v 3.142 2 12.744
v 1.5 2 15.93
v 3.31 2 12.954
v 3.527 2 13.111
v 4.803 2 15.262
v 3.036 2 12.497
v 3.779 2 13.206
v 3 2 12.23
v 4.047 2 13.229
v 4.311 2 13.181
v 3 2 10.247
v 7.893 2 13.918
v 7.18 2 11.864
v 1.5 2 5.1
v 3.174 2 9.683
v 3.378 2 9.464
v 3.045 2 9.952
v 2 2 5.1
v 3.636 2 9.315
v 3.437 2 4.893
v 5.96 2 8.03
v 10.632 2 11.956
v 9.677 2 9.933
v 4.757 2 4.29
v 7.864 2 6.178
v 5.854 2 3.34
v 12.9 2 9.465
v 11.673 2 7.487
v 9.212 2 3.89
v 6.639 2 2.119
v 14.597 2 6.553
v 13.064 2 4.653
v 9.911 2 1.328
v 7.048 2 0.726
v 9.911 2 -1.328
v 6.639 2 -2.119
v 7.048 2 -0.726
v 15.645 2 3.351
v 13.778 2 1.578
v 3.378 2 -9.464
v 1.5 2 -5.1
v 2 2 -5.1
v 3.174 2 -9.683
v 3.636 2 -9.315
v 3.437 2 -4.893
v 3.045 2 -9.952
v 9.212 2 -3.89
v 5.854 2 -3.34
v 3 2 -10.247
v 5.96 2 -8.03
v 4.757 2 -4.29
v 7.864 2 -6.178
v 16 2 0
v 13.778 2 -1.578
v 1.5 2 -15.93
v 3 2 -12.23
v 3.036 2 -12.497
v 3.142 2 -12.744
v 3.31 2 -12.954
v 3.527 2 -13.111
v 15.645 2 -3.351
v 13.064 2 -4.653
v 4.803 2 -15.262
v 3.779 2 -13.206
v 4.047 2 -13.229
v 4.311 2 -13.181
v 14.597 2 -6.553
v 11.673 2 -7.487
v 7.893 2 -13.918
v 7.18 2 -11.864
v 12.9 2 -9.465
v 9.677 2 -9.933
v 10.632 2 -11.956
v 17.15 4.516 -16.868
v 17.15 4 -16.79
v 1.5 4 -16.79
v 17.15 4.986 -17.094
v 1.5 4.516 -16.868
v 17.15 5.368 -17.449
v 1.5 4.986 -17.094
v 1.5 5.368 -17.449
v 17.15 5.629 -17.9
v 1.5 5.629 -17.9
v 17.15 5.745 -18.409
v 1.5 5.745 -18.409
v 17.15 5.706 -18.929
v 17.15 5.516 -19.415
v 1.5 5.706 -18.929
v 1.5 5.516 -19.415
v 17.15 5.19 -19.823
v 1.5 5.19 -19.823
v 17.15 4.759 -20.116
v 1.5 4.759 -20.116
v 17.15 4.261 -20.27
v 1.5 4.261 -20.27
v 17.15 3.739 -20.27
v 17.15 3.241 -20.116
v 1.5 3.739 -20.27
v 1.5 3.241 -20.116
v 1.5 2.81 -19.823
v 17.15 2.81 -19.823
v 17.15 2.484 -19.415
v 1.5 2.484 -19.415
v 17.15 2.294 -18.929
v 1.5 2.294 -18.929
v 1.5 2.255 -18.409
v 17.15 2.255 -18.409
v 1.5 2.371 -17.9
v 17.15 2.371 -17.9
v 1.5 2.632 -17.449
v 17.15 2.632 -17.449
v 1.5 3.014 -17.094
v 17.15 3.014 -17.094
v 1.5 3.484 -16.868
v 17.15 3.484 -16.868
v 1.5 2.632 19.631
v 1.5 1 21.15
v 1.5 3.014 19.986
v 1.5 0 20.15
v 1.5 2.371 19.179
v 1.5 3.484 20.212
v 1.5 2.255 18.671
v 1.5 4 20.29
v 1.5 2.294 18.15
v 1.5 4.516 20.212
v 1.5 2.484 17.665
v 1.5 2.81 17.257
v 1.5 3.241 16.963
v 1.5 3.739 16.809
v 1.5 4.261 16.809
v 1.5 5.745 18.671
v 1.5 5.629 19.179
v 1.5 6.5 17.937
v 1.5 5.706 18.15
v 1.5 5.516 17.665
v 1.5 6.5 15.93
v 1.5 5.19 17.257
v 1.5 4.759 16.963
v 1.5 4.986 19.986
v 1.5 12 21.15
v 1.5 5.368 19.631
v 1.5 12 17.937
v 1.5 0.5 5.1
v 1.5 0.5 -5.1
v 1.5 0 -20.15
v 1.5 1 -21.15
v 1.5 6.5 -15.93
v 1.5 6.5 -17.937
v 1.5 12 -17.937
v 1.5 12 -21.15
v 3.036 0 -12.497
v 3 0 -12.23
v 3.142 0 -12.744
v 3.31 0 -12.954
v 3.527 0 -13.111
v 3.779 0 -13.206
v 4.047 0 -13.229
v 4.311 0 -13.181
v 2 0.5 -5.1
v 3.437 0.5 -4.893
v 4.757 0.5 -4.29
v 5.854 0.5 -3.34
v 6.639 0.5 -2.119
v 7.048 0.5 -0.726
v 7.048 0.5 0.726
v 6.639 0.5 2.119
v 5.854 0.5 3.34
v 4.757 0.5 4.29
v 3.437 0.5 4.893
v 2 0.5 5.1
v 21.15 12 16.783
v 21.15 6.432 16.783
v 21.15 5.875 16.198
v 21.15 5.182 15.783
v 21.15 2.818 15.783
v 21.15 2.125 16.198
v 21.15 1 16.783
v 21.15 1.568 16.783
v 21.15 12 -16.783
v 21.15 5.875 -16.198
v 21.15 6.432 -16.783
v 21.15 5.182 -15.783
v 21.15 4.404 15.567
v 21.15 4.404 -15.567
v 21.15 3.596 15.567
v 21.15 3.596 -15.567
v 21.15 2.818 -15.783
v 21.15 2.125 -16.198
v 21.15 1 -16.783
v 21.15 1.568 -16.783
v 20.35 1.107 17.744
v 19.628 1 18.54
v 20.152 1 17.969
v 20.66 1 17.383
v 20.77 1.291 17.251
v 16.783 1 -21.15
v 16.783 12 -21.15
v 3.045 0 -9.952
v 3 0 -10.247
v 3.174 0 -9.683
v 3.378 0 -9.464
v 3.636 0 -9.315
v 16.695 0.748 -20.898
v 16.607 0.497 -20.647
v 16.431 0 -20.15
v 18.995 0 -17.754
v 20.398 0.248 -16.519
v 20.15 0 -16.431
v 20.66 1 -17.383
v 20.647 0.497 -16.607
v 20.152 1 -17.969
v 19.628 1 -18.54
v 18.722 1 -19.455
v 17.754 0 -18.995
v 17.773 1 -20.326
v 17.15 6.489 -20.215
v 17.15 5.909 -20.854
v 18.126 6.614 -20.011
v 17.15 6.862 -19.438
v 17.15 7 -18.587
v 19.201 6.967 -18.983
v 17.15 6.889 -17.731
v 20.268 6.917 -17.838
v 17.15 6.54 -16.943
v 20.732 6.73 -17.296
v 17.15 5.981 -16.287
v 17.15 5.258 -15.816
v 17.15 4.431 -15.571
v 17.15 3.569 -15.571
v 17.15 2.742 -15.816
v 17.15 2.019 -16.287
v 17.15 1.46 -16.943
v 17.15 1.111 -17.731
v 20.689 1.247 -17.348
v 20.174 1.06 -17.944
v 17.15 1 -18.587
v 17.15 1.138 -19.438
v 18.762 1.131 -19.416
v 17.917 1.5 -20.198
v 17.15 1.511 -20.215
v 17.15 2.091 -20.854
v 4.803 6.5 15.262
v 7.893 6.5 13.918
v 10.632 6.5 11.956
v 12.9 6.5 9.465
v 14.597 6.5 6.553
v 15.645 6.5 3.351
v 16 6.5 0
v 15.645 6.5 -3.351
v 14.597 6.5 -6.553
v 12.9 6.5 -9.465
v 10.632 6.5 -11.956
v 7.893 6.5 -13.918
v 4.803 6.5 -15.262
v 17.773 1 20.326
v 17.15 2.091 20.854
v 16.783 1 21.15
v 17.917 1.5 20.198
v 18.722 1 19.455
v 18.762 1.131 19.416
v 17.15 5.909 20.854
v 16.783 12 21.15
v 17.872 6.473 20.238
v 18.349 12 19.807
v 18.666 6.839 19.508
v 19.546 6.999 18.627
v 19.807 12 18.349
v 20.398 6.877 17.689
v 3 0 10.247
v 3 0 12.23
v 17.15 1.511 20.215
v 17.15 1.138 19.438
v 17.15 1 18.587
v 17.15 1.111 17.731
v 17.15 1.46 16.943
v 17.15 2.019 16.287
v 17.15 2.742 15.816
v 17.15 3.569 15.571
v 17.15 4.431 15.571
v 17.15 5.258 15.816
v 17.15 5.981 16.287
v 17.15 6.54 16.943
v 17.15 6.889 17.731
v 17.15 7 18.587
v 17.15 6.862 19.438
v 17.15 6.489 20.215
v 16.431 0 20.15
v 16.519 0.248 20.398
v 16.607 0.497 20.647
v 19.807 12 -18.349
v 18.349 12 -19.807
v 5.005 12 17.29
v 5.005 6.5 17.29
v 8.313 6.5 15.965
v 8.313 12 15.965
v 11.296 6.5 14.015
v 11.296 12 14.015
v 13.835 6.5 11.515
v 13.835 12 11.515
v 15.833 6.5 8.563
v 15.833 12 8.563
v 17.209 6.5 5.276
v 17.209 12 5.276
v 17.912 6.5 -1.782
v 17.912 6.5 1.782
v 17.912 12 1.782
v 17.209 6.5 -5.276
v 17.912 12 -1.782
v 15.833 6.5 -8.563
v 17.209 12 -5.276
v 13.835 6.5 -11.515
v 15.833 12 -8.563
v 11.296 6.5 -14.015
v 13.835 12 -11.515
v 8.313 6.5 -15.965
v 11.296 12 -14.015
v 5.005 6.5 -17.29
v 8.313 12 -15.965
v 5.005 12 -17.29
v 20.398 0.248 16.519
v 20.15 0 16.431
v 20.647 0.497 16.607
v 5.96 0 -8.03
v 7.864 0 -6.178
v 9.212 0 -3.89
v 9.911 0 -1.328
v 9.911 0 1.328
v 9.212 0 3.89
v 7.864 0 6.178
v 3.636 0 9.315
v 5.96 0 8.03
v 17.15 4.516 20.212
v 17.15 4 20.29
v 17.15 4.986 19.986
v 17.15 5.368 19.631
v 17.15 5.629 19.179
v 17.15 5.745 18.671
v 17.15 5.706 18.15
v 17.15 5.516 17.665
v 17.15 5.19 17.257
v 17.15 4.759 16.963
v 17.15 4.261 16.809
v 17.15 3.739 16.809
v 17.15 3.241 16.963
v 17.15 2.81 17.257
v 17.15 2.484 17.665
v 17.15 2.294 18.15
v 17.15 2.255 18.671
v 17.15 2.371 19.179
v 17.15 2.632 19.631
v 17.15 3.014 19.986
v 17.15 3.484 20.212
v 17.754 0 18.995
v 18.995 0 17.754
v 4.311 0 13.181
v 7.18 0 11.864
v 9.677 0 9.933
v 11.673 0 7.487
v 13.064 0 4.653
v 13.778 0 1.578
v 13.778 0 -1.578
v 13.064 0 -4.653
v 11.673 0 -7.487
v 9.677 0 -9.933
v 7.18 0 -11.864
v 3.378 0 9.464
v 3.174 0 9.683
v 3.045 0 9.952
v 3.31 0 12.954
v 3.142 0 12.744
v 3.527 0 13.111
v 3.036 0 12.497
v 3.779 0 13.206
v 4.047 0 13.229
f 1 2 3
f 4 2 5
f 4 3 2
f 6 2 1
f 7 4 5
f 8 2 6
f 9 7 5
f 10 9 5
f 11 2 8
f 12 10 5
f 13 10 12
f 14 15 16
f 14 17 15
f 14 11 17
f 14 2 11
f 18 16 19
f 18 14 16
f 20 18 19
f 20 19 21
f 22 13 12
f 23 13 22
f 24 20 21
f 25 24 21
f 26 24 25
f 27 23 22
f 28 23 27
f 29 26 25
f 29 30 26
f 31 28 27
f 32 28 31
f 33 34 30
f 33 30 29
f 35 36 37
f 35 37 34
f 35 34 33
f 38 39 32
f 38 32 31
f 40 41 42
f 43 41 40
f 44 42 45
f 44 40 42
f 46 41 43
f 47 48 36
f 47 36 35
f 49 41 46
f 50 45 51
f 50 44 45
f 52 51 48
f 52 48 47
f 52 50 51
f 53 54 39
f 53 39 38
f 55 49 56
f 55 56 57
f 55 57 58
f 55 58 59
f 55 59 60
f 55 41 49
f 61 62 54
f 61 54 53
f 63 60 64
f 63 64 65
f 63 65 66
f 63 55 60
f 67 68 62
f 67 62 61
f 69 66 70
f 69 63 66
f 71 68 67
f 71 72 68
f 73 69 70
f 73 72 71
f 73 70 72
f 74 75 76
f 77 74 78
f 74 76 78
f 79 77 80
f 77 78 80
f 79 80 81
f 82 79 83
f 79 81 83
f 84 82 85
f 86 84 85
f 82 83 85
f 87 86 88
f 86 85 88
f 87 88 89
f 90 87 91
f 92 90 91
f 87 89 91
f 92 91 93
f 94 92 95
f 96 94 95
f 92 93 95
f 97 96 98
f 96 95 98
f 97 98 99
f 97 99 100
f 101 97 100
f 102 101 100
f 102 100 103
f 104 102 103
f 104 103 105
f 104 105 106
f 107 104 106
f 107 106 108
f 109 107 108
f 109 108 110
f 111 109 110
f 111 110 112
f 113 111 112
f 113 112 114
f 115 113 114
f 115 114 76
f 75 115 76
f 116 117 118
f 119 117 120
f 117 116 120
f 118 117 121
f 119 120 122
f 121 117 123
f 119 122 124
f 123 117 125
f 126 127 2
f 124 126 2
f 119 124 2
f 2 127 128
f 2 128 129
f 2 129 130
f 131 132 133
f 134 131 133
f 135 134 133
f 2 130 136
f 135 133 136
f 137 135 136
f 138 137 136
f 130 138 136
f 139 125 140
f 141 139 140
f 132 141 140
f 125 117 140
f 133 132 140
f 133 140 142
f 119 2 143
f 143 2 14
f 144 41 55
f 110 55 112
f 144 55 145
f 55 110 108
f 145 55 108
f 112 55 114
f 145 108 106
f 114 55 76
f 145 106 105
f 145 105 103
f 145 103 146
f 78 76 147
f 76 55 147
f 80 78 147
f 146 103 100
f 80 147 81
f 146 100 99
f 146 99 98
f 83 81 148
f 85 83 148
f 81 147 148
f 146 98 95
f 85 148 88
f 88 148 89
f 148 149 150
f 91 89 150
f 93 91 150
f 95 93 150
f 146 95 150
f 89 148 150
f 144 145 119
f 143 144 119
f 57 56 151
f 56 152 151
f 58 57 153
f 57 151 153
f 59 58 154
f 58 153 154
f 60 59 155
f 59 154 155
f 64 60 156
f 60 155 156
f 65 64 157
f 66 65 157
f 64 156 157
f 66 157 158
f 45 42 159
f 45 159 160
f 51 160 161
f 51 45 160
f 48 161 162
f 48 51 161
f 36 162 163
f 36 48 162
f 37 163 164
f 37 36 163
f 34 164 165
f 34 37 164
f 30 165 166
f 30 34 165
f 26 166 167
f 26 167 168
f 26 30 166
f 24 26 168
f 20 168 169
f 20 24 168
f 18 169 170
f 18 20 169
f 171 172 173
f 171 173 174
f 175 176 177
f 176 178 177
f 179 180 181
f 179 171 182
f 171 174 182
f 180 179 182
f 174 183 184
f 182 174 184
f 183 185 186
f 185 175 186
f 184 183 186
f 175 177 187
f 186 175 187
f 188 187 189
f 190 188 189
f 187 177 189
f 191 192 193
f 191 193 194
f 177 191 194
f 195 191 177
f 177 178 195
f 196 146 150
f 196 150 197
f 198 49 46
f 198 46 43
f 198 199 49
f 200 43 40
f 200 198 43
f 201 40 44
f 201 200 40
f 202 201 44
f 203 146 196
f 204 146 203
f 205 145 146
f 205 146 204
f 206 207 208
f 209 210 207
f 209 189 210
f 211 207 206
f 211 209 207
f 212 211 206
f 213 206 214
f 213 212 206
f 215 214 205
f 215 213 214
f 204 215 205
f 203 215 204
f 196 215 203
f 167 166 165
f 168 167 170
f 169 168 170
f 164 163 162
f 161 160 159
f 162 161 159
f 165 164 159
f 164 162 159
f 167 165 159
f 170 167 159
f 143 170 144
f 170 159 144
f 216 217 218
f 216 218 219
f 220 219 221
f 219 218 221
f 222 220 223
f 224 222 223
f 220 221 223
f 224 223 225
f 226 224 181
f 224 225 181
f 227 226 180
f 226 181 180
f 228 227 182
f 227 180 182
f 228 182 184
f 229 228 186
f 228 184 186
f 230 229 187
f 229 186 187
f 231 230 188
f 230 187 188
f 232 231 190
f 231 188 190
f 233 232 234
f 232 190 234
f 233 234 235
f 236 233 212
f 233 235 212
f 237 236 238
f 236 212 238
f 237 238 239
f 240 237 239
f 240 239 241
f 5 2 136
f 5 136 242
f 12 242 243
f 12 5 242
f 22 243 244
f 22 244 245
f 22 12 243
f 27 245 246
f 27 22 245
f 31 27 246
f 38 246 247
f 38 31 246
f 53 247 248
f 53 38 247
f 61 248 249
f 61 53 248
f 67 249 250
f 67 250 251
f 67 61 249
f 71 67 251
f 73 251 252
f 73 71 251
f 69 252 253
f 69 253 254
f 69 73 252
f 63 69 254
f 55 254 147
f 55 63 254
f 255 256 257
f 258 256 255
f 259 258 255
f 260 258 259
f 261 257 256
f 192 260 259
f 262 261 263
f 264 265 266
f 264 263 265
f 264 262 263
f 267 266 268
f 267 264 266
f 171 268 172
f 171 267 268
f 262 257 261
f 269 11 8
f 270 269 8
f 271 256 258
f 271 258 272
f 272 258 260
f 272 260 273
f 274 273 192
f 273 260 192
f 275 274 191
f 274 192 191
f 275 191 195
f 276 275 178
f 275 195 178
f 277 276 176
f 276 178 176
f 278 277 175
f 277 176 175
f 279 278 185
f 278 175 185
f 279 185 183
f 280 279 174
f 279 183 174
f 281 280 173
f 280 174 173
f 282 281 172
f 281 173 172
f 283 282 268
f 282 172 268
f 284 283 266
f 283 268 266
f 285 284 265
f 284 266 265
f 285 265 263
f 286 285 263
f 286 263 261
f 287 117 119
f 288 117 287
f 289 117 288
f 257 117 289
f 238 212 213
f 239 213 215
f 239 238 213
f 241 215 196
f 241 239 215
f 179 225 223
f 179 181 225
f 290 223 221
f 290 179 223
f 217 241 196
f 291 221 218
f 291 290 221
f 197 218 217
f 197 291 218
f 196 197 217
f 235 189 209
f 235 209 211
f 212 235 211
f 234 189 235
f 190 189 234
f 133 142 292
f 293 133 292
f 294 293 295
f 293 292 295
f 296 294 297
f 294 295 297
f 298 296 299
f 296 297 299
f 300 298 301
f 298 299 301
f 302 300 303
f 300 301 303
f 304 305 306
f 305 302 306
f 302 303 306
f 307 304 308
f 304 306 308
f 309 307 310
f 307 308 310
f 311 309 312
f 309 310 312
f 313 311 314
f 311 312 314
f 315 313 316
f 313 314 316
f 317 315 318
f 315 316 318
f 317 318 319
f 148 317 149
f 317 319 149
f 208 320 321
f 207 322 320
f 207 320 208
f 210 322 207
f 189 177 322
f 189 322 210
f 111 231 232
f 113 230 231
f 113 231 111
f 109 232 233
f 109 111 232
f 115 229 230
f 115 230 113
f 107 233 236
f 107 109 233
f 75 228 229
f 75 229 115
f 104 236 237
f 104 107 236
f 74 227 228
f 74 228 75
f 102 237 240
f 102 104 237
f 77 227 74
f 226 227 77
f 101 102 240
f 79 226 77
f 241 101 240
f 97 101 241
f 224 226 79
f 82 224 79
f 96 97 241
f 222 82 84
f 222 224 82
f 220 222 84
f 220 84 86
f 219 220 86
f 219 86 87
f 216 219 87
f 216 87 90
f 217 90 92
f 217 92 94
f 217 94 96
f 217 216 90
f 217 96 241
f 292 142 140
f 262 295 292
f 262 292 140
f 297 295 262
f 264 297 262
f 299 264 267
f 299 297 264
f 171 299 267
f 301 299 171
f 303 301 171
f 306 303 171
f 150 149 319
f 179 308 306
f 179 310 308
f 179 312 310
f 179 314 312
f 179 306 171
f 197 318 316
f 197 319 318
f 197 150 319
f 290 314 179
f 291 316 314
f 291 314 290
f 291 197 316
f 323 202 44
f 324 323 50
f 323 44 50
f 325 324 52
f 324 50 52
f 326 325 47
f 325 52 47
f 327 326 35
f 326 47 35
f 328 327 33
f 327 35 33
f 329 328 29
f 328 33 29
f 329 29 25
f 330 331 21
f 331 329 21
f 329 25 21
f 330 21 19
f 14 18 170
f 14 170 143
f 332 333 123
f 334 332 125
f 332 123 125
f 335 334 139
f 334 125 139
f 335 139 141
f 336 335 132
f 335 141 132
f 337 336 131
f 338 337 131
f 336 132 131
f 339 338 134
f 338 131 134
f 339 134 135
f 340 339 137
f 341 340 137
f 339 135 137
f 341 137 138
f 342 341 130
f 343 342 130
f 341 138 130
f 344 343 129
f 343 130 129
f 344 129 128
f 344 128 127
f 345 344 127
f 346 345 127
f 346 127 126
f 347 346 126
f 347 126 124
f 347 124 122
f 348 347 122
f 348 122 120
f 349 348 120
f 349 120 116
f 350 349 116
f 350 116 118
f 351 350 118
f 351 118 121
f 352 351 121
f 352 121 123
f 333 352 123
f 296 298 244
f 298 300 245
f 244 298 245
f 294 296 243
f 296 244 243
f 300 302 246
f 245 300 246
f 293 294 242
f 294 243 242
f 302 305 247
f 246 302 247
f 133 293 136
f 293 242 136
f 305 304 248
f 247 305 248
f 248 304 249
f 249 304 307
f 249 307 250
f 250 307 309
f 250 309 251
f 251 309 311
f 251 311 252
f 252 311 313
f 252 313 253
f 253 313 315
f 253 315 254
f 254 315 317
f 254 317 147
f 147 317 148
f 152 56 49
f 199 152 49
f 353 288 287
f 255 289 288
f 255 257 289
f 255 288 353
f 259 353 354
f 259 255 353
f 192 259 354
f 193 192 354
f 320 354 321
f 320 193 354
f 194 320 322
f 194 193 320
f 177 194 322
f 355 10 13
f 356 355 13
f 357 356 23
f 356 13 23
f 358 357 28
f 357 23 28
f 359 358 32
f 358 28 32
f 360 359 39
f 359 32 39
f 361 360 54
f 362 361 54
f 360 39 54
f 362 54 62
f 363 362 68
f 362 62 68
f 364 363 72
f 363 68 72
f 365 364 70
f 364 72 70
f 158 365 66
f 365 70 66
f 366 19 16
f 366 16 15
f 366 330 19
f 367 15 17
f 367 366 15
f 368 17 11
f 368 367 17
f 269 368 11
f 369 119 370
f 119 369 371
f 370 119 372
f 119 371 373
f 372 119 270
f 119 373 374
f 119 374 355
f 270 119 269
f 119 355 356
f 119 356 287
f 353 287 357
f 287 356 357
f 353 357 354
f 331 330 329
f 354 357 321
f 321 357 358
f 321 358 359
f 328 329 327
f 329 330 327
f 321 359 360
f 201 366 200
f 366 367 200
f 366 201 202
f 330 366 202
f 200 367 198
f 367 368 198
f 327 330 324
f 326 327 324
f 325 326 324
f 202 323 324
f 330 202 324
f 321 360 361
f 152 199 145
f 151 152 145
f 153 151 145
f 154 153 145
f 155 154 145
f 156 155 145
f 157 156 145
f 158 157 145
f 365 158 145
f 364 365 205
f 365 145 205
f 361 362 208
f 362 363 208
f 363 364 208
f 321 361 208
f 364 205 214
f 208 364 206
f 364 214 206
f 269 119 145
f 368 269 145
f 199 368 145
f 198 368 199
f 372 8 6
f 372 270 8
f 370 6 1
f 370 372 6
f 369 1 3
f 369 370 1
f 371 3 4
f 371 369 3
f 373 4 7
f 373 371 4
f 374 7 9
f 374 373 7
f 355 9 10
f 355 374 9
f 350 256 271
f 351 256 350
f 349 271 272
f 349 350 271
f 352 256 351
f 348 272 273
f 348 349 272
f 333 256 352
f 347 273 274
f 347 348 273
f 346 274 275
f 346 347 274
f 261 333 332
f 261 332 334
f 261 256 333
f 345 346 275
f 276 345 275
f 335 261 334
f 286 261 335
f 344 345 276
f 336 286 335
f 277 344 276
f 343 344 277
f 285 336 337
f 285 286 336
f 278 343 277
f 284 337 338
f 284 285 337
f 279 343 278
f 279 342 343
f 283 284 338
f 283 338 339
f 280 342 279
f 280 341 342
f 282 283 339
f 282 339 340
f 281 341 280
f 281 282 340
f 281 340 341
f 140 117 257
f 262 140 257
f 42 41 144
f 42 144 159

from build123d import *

# Parameters (mm, degrees)
SKETCH2_W                = 42.3
SKETCH2_H                = 42.3
BOSS_EXTRUDE1_DEPTH      = 12
SKETCH5_R                = 29.910616844
SKETCH5_R_2              = 27
CUT_EXTRUDE4_DEPTH       = 13
CUT_EXTRUDE5_DEPTH       = 10
CUT_EXTRUDE6_DEPTH       = 1.5
BOSS_EXTRUDE2_DEPTH      = 4.5
SKETCH13_W               = 22.65
SKETCH13_H               = 42.3
CUT_EXTRUDE9_DEPTH       = 13
CHAMFER4_SIZE            = 1
CUT_EXTRUDE8_DEPTH       = 3
FILLET12_R               = 1
SKETCH14_R               = 1.75
CUT_EXTRUDE10_DEPTH      = 1
CUT_EXTRUDE10_DEPTH_BACK = 20.65
SKETCH15_R               = 3
CUT_EXTRUDE11_DEPTH      = 4


with BuildPart() as part:
    # Sketch2 → Boss-Extrude1 (new body)
    with BuildSketch(Plane(origin=(0, 0, 0), x_dir=(1, 0, 0), z_dir=(0, 1, 0))):
        Rectangle(SKETCH2_W, SKETCH2_H)
    extrude(amount=BOSS_EXTRUDE1_DEPTH)

    # Sketch5 → Cut-Extrude4 (cut, through all)
    with BuildSketch(Plane(origin=(0, 12, 0), x_dir=(1, 0, 0), z_dir=(0, 1, 0))):
        Circle(SKETCH5_R)
        Circle(SKETCH5_R_2, mode=Mode.SUBTRACT)
    extrude(amount=-CUT_EXTRUDE4_DEPTH, mode=Mode.SUBTRACT)

    # Sketch6 → Cut-Extrude5 (cut)
    with BuildSketch(Plane(origin=(0, 12, 0), x_dir=(1, 0, 0), z_dir=(0, 1, 0))):
        with BuildLine():
            Line((0, 18), (-21.15, 18))
            Line((-21.15, 18), (-21.15, -18))
            Line((-21.15, -18), (0, -18))
            ThreePointArc((0, -18), (18, 0), (0, 18))
        make_face()
    extrude(amount=-CUT_EXTRUDE5_DEPTH, mode=Mode.SUBTRACT)

    # Sketch7 → Cut-Extrude6 (cut)
    with BuildSketch(Plane(origin=(0, 2, 0), x_dir=(1, 0, 0), z_dir=(0, 1, 0))):
        with BuildLine():
            Line((-2, 5.1), (2, 5.1))
            ThreePointArc((2, 5.1), (7.1, 0), (2, -5.1))
            Line((2, -5.1), (-2, -5.1))
            ThreePointArc((-2, -5.1), (-7.1, 0), (-2, 5.1))
        make_face()
    extrude(amount=-CUT_EXTRUDE6_DEPTH, mode=Mode.SUBTRACT)

    # Sketch8 → Boss-Extrude2 (add)
    with BuildSketch(Plane(origin=(0, 2, 0), x_dir=(1, 0, 0), z_dir=(0, 1, 0))):
        with BuildLine():
            Line((0, 16), (-21.15, 16))
            Line((-21.15, 16), (-21.15, 16.783250579))
            ThreePointArc((-21.15, 16.783250579), (-20.646271202, 17.399180597), (-20.124611797, 18))
            Line((-20.124611797, 18), (0, 18))
            ThreePointArc((0, 18), (18, 0), (0, -18))
            Line((0, -18), (-20.124611797, -18))
            ThreePointArc((-20.124611797, -18), (-20.646271202, -17.399180597), (-21.15, -16.783250579))
            Line((-21.15, -16.783250579), (-21.15, -16))
            Line((-21.15, -16), (0, -16))
            ThreePointArc((0, -16), (16, 0), (0, 16))
        make_face()
    extrude(amount=BOSS_EXTRUDE2_DEPTH)

    # Sketch13 → Cut-Extrude9 (cut, through all)
    with BuildSketch(Plane(origin=(0, 12, 0), x_dir=(1, 0, 0), z_dir=(0, 1, 0))):
        with Locations((-9.825, 0)):
            Rectangle(SKETCH13_W, SKETCH13_H)
    extrude(amount=-CUT_EXTRUDE9_DEPTH, mode=Mode.SUBTRACT)

    # Chamfer4
    chamfer4_edges = [part.edges().sort_by_distance(p)[0] for p in [
        (9.14162529, 0, 21.15),
        (21.15, 0, 0),
        (9.14162529, 0, -21.15),
        (19.091883092, 0, -19.091883092),
        (19.091883092, 0, 19.091883092),
    ]]
    chamfer(chamfer4_edges, length=CHAMFER4_SIZE)

    # Sketch11 → Cut-Extrude8 (cut, through all)
    with BuildSketch(Plane(origin=(0, 2, 0), x_dir=(1, 0, 0), z_dir=(0, 1, 0))):
        with BuildLine():
            Line((3, 13.539392014), (3, 9.539392014))
            ThreePointArc((3, 9.539392014), (10, 0), (3, -9.539392014))
            Line((3, -9.539392014), (3, -13.539392014))
            ThreePointArc((3, -13.539392014), (13.867773293, 0), (3, 13.539392014))
        make_face()
    extrude(amount=-CUT_EXTRUDE8_DEPTH, mode=Mode.SUBTRACT)

    # Fillet12
    fillet12_edges = [part.edges().sort_by_distance(p)[0] for p in [
        (3, 1, -13.539392014),
        (3, 1, 13.539392014),
        (3, 1, 9.539392014),
        (3, 1, -9.539392014),
    ]]
    fillet(fillet12_edges, radius=FILLET12_R)

    # Sketch14 → Cut-Extrude10 (cut, two sides)
    with BuildSketch(Plane.ZY.offset(-1.5)) as cut_extrude10_sk:
        with Locations((-18.539766161, 4)):
            Circle(SKETCH14_R)
        with Locations((18.539766161, 4)):
            Circle(SKETCH14_R)
    extrude(amount=CUT_EXTRUDE10_DEPTH, mode=Mode.SUBTRACT)
    extrude(cut_extrude10_sk.sketch, amount=-CUT_EXTRUDE10_DEPTH_BACK, mode=Mode.SUBTRACT)

    # Sketch15 → Cut-Extrude11 (cut)
    with BuildSketch(Plane(origin=(21.15, 0, 0), x_dir=(0, 0, -1), z_dir=(1, 0, 0))):
        with Locations((-18.539766161, 4)):
            Circle(SKETCH15_R)
        with Locations((18.539766161, 4)):
            Circle(SKETCH15_R)
    extrude(amount=-CUT_EXTRUDE11_DEPTH, mode=Mode.SUBTRACT)


solid = part.part
